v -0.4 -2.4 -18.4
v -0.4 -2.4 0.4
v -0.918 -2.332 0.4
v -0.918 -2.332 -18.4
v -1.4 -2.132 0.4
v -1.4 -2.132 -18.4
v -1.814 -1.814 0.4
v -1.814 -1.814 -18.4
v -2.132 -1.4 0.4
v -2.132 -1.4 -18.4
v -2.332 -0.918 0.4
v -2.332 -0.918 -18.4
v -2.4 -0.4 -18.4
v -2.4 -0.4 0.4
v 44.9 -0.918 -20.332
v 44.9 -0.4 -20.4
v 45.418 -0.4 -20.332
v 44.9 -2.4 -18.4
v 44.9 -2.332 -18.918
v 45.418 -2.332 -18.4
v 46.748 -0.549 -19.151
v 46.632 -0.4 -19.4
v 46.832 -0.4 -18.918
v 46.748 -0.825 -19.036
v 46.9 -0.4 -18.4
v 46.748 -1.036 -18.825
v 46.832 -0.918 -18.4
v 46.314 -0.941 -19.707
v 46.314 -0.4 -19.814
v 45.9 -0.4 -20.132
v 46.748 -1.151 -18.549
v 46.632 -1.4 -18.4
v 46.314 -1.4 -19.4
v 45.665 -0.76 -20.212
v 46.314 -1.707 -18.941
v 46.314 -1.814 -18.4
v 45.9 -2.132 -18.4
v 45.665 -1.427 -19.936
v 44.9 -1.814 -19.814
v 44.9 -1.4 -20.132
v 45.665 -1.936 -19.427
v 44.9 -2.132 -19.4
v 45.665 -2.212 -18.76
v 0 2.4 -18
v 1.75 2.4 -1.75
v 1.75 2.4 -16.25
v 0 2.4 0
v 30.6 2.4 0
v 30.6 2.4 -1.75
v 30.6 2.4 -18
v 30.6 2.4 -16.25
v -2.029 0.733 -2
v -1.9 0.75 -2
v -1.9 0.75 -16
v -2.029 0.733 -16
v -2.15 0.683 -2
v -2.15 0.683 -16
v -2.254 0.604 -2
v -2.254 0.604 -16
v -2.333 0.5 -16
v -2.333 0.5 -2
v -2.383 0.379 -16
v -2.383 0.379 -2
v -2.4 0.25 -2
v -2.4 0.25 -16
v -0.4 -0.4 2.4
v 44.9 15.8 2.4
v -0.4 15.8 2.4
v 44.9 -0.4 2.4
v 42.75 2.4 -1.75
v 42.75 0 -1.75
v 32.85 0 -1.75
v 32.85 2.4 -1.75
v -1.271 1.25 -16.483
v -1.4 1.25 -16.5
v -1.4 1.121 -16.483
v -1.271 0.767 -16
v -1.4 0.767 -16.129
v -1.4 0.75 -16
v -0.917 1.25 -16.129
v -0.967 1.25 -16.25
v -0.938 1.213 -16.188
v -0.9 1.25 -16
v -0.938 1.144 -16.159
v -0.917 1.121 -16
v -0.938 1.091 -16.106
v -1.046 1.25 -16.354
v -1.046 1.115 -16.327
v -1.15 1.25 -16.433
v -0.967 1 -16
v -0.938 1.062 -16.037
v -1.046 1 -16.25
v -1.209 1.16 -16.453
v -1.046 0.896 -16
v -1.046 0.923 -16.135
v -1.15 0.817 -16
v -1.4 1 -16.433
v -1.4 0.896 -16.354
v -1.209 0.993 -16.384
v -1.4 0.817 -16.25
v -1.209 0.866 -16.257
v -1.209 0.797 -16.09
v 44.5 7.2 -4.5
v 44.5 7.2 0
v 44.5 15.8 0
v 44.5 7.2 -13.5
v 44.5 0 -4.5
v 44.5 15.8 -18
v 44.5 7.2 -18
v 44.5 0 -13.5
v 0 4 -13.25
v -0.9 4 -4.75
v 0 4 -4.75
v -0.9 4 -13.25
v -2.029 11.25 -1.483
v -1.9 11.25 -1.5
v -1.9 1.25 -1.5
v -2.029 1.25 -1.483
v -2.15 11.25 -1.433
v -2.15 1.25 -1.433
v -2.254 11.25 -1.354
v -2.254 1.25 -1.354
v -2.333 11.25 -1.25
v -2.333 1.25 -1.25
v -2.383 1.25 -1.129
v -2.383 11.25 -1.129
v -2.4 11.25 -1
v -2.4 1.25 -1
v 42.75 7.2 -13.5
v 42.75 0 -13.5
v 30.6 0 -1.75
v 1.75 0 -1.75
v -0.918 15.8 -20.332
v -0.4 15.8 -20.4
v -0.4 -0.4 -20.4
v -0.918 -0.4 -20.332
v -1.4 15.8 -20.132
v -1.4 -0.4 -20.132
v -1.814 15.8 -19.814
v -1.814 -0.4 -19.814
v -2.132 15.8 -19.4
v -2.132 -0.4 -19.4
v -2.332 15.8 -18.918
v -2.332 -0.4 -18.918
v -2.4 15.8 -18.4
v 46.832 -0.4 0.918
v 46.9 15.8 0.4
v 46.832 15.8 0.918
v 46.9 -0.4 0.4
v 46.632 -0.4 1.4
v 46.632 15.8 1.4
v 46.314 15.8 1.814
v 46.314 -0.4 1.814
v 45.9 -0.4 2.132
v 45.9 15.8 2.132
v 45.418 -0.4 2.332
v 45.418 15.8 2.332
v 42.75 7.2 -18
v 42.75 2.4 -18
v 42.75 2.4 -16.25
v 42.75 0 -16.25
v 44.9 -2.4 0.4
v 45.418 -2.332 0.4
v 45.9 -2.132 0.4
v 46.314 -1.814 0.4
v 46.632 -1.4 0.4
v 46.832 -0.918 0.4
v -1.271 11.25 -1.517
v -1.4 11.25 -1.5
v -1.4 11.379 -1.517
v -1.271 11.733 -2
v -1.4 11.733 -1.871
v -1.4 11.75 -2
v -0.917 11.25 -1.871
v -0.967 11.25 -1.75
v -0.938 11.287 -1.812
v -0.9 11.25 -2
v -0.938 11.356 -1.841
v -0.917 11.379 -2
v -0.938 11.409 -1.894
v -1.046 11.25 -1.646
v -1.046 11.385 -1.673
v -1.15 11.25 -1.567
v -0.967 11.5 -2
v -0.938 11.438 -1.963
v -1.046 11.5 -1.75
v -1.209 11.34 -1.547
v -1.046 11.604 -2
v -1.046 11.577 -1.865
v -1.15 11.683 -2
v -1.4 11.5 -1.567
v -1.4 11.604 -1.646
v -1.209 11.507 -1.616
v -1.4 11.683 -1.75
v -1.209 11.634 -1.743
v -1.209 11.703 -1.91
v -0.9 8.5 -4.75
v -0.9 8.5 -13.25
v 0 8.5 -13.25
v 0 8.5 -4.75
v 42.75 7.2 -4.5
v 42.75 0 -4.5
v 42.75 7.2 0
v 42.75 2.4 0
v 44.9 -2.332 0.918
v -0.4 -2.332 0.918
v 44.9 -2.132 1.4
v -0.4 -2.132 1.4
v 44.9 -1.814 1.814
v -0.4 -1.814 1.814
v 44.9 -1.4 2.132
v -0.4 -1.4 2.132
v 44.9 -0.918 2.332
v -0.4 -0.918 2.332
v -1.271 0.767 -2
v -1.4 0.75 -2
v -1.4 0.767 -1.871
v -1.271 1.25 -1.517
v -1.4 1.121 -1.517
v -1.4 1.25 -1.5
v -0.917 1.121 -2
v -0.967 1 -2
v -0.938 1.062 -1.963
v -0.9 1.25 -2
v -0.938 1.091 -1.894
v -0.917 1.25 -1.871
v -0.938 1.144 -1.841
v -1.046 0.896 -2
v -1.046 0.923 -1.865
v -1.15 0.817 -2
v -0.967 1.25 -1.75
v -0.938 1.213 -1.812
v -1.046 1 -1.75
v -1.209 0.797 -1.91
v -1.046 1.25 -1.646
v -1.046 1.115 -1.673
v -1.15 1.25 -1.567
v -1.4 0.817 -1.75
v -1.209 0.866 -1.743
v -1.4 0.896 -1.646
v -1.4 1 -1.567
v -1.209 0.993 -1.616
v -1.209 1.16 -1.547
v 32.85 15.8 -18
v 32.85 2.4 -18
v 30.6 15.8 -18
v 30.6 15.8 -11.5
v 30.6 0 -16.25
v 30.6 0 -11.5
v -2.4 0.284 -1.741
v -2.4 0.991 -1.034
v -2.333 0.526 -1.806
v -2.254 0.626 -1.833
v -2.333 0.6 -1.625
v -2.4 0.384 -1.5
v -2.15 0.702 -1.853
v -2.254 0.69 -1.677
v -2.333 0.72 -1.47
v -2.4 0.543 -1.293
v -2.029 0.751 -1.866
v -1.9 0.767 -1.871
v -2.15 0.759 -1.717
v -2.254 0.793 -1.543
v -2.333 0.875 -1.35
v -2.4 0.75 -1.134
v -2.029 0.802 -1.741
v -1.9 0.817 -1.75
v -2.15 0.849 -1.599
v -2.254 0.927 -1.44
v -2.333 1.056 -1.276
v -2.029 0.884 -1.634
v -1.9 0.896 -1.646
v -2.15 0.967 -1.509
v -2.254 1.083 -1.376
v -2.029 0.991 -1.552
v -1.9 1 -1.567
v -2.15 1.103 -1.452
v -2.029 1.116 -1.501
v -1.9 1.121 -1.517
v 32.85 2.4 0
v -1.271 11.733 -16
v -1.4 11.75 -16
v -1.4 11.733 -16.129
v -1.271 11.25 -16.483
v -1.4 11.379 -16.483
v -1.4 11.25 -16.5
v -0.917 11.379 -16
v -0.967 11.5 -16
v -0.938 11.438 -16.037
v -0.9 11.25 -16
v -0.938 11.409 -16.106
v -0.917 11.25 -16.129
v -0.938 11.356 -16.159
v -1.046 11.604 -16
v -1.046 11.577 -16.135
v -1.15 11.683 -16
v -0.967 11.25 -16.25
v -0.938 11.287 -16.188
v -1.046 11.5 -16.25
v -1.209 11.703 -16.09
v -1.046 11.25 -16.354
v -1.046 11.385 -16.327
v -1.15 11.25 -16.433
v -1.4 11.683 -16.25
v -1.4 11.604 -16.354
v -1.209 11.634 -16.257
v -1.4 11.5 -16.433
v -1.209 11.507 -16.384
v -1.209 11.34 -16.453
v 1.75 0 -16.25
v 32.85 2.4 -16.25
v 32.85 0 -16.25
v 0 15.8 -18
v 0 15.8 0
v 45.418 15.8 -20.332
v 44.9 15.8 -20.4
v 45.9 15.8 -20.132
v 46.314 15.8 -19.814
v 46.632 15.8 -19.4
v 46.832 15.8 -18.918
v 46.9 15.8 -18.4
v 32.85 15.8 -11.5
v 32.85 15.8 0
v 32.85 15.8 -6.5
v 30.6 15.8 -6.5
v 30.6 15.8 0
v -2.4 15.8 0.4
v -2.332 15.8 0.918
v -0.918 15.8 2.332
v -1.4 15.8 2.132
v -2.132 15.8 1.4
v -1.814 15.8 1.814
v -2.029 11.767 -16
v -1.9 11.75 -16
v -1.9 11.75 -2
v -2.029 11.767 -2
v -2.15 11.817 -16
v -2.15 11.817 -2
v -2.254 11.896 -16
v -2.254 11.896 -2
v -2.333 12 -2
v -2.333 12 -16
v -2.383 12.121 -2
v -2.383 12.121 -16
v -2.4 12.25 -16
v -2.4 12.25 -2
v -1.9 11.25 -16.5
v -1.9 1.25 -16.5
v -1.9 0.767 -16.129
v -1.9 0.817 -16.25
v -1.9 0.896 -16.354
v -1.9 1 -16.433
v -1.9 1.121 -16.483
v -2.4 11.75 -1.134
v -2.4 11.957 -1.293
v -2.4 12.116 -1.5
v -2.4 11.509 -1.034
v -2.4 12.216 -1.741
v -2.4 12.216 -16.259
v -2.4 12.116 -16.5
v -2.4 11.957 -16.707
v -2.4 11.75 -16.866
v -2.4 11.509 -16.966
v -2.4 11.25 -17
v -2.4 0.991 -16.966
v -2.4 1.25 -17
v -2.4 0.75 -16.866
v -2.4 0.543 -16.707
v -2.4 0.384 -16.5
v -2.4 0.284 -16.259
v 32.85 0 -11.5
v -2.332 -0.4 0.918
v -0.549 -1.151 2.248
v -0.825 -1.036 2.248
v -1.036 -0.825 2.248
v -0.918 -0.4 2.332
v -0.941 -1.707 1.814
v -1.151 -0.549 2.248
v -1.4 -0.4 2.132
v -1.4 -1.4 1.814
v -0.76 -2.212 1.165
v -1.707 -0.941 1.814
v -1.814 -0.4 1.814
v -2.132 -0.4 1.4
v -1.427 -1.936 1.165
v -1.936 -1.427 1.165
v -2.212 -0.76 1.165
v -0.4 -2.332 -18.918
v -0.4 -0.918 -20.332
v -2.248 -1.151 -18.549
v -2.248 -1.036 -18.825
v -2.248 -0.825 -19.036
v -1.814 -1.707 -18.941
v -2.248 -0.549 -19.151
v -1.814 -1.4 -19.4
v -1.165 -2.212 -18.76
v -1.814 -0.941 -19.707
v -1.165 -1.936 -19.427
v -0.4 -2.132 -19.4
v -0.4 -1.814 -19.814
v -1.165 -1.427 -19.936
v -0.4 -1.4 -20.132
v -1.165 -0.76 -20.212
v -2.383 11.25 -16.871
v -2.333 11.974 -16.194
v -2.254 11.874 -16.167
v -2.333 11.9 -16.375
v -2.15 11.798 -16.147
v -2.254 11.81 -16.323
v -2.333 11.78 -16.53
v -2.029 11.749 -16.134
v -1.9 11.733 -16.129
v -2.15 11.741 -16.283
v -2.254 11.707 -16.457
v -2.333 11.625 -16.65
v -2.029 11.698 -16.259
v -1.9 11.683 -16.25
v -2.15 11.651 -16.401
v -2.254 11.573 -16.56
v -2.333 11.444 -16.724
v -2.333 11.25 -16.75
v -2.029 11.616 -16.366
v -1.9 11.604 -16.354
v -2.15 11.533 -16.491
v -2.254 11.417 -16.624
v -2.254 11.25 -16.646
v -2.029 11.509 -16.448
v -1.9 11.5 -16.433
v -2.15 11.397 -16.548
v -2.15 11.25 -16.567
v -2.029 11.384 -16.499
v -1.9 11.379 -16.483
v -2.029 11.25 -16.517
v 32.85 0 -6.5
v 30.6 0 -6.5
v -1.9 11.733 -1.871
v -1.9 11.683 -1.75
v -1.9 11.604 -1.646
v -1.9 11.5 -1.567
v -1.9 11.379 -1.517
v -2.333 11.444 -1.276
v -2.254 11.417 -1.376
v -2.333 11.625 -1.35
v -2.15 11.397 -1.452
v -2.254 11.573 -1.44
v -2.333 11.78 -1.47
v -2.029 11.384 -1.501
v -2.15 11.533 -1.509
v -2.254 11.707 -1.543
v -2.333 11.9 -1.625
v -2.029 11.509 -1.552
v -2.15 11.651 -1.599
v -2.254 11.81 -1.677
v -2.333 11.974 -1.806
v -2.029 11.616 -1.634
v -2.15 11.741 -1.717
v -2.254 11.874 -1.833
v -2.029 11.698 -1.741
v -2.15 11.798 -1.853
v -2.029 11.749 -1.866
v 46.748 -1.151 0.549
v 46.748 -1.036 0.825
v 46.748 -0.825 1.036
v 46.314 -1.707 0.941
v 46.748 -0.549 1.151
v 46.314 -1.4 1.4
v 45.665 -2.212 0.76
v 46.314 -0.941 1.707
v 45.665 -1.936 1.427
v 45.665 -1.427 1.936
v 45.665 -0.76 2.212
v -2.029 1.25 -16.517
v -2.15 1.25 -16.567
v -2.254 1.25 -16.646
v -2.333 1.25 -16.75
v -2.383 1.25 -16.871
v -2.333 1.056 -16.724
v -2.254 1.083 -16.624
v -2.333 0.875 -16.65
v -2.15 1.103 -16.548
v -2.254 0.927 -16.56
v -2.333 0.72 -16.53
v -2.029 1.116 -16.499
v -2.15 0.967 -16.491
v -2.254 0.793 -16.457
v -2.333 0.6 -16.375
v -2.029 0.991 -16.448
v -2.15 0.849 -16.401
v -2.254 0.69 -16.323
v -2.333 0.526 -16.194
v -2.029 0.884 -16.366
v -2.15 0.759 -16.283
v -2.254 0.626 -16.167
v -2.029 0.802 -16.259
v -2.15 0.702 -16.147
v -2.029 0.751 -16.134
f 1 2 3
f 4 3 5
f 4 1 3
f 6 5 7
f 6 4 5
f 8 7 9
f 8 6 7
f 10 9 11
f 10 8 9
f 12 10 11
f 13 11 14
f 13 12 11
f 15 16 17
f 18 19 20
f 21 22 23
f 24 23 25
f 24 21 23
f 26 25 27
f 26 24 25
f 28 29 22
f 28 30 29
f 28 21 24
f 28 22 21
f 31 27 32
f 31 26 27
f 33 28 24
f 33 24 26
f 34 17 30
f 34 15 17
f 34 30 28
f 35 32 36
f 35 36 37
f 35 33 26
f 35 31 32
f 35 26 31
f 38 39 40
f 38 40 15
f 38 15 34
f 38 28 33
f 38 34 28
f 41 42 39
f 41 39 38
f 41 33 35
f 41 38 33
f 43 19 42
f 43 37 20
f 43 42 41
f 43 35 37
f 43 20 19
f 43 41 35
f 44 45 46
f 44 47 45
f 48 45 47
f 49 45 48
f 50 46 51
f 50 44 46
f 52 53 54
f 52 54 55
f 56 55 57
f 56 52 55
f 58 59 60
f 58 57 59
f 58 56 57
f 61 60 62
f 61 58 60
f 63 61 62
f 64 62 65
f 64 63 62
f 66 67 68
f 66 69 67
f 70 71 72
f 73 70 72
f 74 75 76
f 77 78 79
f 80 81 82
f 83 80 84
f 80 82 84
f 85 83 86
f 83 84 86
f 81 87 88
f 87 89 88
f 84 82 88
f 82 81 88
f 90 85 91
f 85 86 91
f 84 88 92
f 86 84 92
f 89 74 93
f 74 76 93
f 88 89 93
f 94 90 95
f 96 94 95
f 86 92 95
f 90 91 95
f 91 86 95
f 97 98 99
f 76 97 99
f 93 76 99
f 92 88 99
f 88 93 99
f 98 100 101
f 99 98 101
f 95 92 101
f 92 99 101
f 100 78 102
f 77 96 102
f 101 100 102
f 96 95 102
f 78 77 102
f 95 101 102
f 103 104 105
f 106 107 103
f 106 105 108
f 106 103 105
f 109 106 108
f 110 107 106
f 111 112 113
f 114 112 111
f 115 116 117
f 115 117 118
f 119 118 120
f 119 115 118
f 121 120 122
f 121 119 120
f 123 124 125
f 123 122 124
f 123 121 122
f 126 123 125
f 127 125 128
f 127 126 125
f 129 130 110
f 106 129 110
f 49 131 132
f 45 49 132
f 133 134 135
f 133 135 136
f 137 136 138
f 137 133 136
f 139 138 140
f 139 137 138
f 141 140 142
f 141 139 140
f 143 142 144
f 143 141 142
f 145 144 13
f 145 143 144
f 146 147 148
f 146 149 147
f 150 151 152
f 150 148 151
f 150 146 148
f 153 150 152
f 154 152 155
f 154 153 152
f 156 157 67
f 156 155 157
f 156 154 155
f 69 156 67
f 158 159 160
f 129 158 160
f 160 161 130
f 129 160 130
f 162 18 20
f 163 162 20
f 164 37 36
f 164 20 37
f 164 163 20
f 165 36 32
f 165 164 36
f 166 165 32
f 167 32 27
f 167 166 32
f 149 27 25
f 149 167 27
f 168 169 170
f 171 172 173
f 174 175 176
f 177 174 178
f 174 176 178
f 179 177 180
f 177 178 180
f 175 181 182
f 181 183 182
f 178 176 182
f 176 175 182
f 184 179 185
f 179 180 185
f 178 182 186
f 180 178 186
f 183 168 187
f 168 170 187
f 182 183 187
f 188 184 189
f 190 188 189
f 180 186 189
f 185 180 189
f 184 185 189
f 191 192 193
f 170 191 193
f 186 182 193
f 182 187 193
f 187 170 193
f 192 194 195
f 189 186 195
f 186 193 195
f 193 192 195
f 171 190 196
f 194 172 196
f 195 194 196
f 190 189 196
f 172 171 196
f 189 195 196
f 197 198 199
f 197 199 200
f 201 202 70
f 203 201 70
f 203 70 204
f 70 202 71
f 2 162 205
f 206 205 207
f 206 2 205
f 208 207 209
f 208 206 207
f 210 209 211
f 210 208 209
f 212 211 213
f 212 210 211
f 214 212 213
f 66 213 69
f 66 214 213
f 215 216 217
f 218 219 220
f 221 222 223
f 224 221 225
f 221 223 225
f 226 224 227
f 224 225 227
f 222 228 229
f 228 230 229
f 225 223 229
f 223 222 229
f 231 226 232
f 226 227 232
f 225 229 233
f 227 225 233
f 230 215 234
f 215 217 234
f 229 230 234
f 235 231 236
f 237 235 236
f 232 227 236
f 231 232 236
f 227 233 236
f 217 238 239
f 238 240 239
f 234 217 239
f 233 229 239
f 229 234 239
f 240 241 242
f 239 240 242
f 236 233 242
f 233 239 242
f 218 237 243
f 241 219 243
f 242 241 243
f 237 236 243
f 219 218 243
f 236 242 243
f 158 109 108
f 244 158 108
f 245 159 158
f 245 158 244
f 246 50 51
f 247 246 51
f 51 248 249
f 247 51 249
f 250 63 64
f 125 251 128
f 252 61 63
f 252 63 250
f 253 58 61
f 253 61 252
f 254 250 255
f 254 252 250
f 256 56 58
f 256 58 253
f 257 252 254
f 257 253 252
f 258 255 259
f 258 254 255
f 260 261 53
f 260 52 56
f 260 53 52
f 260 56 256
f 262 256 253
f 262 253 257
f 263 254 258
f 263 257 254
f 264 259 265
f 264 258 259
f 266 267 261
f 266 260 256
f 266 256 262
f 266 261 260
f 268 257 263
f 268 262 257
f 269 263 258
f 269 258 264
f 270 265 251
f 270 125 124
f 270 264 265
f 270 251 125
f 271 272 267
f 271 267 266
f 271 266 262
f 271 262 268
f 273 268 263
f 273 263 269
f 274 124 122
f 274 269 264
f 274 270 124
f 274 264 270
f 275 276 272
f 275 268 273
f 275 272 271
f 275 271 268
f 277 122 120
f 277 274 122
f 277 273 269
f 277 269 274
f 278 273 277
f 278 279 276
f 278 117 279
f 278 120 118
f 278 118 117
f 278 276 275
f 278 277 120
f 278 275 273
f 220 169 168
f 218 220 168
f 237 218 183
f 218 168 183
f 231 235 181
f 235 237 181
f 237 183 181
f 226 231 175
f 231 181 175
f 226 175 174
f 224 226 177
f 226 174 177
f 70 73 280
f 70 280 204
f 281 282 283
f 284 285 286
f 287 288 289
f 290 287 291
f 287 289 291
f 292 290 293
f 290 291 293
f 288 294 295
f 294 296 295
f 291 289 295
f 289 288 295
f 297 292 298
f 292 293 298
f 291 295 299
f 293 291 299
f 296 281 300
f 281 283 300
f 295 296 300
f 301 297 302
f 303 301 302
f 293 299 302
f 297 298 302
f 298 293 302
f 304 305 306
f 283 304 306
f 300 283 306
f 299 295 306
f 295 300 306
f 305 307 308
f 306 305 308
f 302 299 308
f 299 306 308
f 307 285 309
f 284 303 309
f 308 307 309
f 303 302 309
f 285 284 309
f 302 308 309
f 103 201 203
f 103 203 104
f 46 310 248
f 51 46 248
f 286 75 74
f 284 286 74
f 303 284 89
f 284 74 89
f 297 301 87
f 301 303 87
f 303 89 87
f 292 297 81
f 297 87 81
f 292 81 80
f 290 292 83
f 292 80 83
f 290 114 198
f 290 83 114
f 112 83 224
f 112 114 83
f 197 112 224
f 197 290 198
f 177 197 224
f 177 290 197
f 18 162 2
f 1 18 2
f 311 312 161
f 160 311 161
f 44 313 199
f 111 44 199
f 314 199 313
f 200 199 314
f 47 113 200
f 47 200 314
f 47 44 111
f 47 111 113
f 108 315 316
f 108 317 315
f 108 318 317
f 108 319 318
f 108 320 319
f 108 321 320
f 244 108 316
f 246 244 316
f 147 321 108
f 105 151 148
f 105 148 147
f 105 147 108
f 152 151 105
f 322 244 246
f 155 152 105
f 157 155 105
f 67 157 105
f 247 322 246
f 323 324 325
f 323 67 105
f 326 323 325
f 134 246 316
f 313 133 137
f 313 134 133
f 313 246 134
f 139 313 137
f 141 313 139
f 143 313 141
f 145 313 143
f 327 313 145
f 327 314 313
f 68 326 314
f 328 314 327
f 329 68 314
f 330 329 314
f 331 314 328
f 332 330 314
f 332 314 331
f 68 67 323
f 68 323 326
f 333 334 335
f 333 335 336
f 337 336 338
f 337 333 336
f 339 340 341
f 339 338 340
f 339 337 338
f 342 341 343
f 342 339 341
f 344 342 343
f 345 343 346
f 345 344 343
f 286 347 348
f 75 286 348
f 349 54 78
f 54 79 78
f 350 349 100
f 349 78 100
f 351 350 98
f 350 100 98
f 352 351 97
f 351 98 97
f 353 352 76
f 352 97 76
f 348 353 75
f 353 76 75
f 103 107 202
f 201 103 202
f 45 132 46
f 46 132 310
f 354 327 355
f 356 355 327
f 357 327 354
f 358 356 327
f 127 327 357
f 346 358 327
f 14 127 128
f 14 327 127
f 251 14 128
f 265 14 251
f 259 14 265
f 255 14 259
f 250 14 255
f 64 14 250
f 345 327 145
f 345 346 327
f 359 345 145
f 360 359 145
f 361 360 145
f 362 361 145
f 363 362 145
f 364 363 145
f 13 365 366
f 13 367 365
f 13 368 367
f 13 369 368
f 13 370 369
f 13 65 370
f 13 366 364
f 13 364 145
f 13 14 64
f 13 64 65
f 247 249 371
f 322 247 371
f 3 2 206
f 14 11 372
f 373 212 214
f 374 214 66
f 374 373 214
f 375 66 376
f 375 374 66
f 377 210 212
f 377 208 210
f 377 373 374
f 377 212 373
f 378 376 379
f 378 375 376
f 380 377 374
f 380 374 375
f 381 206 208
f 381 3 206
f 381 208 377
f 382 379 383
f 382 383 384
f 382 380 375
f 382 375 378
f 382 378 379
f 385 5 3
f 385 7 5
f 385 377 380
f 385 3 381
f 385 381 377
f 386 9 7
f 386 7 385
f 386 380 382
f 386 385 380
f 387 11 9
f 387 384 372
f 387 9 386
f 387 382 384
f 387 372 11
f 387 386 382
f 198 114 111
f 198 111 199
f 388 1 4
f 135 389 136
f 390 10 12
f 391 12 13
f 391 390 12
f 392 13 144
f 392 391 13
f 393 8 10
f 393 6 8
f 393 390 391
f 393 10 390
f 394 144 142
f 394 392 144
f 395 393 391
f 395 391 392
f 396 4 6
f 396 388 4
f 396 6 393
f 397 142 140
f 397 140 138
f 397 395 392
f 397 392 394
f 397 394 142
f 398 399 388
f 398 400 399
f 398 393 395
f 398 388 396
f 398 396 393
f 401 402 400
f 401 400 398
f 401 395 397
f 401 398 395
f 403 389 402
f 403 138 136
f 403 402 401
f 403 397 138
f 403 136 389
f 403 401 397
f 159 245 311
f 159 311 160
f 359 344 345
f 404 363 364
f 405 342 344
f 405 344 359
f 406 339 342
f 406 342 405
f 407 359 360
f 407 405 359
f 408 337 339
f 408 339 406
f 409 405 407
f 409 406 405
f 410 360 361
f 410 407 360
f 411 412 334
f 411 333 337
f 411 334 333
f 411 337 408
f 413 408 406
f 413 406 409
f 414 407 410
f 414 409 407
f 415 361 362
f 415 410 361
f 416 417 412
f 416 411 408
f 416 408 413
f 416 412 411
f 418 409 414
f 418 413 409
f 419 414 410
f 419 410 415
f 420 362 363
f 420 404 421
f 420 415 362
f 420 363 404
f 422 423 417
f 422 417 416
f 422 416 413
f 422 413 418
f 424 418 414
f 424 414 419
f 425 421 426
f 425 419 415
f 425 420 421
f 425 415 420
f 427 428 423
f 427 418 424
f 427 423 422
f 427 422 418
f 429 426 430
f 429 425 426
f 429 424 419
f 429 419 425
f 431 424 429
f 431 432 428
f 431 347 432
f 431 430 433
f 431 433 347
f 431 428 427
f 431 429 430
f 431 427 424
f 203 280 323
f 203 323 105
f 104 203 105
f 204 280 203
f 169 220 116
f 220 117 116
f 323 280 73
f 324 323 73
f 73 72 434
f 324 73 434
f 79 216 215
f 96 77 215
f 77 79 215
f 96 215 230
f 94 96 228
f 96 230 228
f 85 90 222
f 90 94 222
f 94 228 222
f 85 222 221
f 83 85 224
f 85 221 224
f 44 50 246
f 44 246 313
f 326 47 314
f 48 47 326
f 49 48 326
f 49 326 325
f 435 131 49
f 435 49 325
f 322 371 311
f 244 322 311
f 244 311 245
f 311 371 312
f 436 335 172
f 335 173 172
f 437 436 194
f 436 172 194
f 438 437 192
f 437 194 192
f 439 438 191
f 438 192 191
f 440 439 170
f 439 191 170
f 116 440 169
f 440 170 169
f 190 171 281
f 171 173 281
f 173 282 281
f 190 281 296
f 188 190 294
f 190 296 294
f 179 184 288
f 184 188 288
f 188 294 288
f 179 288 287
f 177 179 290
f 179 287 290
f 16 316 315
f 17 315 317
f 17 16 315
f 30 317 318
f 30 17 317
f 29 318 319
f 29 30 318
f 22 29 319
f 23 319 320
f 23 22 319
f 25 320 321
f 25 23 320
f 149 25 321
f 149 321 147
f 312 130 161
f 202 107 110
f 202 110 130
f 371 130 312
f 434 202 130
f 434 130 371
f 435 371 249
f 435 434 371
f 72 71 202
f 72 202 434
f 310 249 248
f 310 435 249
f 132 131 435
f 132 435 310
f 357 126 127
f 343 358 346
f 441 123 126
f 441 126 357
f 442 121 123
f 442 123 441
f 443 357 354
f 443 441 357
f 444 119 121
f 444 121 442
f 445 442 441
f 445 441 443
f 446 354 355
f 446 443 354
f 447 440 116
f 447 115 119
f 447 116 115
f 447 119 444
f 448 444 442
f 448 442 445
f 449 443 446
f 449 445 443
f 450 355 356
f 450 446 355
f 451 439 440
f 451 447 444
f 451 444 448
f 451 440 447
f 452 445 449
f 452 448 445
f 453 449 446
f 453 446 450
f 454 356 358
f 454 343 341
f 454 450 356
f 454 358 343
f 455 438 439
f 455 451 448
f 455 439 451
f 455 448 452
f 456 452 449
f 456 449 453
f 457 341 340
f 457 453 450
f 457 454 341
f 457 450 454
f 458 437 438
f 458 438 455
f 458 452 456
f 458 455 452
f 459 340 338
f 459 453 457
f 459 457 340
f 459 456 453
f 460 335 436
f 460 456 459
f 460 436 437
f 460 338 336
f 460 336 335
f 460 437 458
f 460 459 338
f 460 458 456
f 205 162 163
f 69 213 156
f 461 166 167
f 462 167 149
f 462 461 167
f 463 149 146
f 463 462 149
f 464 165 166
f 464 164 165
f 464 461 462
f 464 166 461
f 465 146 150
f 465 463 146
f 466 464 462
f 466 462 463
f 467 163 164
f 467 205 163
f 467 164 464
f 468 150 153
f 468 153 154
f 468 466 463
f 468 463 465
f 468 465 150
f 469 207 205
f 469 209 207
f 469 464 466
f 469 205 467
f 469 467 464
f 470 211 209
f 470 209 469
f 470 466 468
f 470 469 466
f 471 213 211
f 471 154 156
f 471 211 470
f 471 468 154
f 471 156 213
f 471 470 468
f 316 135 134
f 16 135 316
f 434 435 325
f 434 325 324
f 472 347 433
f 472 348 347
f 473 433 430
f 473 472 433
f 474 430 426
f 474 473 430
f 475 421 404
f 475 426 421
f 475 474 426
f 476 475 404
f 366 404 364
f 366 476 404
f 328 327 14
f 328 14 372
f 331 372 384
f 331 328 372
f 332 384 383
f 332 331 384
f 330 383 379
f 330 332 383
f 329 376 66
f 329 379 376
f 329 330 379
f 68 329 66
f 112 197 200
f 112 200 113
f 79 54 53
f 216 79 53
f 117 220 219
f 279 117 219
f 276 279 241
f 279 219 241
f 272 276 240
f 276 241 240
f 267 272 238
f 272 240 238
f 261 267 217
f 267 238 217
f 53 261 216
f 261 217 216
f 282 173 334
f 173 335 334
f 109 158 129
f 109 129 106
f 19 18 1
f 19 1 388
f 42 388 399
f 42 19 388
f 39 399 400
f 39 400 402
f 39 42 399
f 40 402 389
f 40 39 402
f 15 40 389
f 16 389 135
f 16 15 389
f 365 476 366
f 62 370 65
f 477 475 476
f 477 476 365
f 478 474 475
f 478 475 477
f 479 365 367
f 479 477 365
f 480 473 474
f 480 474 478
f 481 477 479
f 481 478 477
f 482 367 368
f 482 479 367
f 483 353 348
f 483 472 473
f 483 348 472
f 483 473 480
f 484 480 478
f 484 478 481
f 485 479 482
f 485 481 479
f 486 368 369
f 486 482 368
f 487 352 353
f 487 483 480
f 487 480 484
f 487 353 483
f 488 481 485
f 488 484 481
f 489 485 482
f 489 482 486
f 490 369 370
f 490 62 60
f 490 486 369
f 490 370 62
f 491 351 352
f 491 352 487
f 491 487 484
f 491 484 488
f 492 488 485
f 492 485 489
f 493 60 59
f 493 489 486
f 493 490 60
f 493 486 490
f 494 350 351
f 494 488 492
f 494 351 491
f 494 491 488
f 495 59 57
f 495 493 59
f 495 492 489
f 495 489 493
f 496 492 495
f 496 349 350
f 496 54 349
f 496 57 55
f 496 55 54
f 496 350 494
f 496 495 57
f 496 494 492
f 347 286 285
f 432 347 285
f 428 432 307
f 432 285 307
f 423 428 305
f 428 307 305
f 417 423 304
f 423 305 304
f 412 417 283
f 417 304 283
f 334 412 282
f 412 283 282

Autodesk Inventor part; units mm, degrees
ref_plane "YZ Plane" through (0, 0, 0) normal (1, 0, 0) x (0, 1, 0)
ref_plane "XZ Plane" through (0, 0, 0) normal (0, 1, 0) x (-1, 0, 0)
ref_plane "XY Plane" through (0, 0, 0) normal (0, 0, 1) x (1, 0, 0)
sketch "Sketch1" plane through (0, 0, 0) normal (0, 1, 0) x (-1, 0, 0)
  line L0 (0, 0) -> (-44.5, 0)
  line L1 (-44.5, 0) -> (-44.5, -18)
  line L2 (-44.5, -18) -> (0, -18)
  line L3 (0, -18) -> (0, 0)
  line L4 (2.4, -20.4) -> (-46.9, -20.4)
  line L5 (-46.9, -20.4) -> (-46.9, 2.4)
  line L6 (-46.9, 2.4) -> (2.4, 2.4)
  line L7 (2.4, 2.4) -> (2.4, -20.4)
  dimension "d0" = 18
  dimension "d1" = 44.5
  dimension "d2" = 2.4
extrude "Extrusion1" add sketch "Sketch1" against normal blind 2.4 contours L3 L2 L1 L0 | L4 L5 L6 L7
extrude "Extrusion2" add sketch "Sketch1" along normal blind 15.8
sketch "Sketch2" plane through (0, 0, 0) normal (0, 1, 0) x (1, 0, 0)
  line L0 (0, 0) -> (44.5, 0) projected
  line L1 (44.5, 0) -> (44.5, 18) projected
  line L2 (44.5, 18) -> (0, 18) projected
  line L3 (0, 18) -> (0, 0) projected
  line L4 (1.75, 16.25) -> (42.75, 16.25)
  line L5 (42.75, 16.25) -> (42.75, 1.75)
  line L6 (42.75, 1.75) -> (1.75, 1.75)
  line L7 (1.75, 1.75) -> (1.75, 16.25)
  line L8 (32.85, 17.25) -> (42.75, 17.25)
  line L9 (42.75, 17.25) -> (42.75, 0.75)
  line L10 (42.75, 0.75) -> (32.85, 0.75)
  line L11 (32.85, 0.75) -> (32.85, 17.25)
  line L12 (42.75, 13.5) -> (44.5, 13.5)
  line L13 (44.5, 13.5) -> (44.5, 4.5)
  line L14 (44.5, 4.5) -> (42.75, 4.5)
  line L15 (42.75, 4.5) -> (42.75, 13.5)
  line L16 (44.5, 18) -> (44.5, 0) projected
  point P0 (42.75, 9)
  point P1 (44.5, 9)
  point P2 (43.625, 4.5)
  point P3 (42.75, 4.5)
  point P4 (42.75, 13.5)
  dimension "d7" = 1.75
  dimension "d8" = 9.9
  dimension "d9" = 16.5
  dimension "d10" = 9
extrude "Extrusion3" add sketch "Sketch2" along normal blind 2.4 contours L3 L2 L1 L12 L5 L9 L8 L11 L4 L7 L6 L10 L14 L0 | L9 L10 L11 L6 | L4 L11 L8 L9
sketch "Sketch3" plane through (0, 2.4, 0) normal (0, 1, 0) x (1, 0, 0)
  line L0 (32.85, 0.75) -> (32.85, 17.25) projected
  line L1 (44.5, 4.5) -> (44.5, 0) projected
  line L2 (44.5, 4.5) -> (42.75, 4.5) projected
  line L3 (42.75, 4.5) -> (42.75, 1.75) projected
  line L4 (42.75, 1.75) -> (1.75, 1.75) projected
  line L5 (1.75, 1.75) -> (1.75, 16.25) projected
  line L6 (1.75, 16.25) -> (42.75, 16.25) projected
  line L7 (42.75, 16.25) -> (42.75, 13.5) projected
  line L8 (42.75, 13.5) -> (44.5, 13.5) projected
  line L9 (44.5, 18) -> (44.5, 13.5) projected
  line L10 (0, 18) -> (44.5, 18) projected
  line L11 (0, 0) -> (0, 18) projected
  line L12 (44.5, 0) -> (0, 0) projected
  line L13 (32.85, 18) -> (30.6, 18)
  line L14 (30.6, 18) -> (30.6, 11.5)
  line L15 (30.6, 11.5) -> (32.85, 11.5)
  line L16 (32.85, 11.5) -> (32.85, 18)
  line L17 (32.85, 0) -> (30.6, 0)
  line L18 (30.6, 0) -> (30.6, 6.5)
  line L19 (30.6, 6.5) -> (32.85, 6.5)
  line L20 (32.85, 6.5) -> (32.85, 0)
  line L21 (44.5, 0) -> (0, 0) projected
  line L22 (0, 18) -> (44.5, 18) projected
  point P0 (30.6, 1.75)
  point P1 (32.85, 1.75)
  point P2 (32.85, 16.25)
  point P3 (30.6, 16.25)
  point P4 (32.85, 0)
  dimension "d13" = 5
  dimension "d14" = 30.6
extrude "Extrusion4" add sketch "Sketch3" against normal up to surface (2.4 mm away) contours L0 L4 L18 L19 | L15 L14 L6 L0
extrude "Extrusion5" add sketch "Sketch3" along normal up to surface (13.4 mm away) contours L0 L4 L18 L19 | L15 L14 L6 L0 | L0 L20 L12 L18 L4 | L6 L14 L10 L16 L0
sketch "Sketch4" plane through (0, 2.4, 0) normal (0, 1, 0) x (1, 0, 0)
  line L0 (32.85, 18) -> (32.85, 16.25) projected
  line L1 (32.85, 16.25) -> (42.75, 16.25) projected
  line L2 (42.75, 16.25) -> (42.75, 13.5) projected
  line L3 (42.75, 13.5) -> (44.5, 13.5) projected
  line L4 (44.5, 18) -> (44.5, 13.5) projected
  line L5 (32.85, 18) -> (44.5, 18) projected
  line L6 (32.85, 1.75) -> (32.85, 0) projected
  line L7 (44.5, 0) -> (32.85, 0) projected
  line L8 (44.5, 4.5) -> (44.5, 0) projected
  line L9 (44.5, 4.5) -> (42.75, 4.5) projected
  line L10 (42.75, 4.5) -> (42.75, 1.75) projected
  line L11 (42.75, 1.75) -> (32.85, 1.75) projected
  line L12 (42.75, 16.25) -> (42.75, 18)
  line L13 (42.75, 1.75) -> (42.75, 0)
  point P0 (0, 0)
extrude "Extrusion6" add sketch "Sketch4" along normal blind 4.8 contours L5 L4 L3 L2 L12 | L10 L9 L8 L7 L13
sketch "Sketch5" plane through (-2.4, -2.4, -20.4) normal (-1, 0, 0) x (0, 0, 1)
  line L0 (20.4, 4.8) -> (2.4, 4.8) projected
  line L1 (7.15, 10.9) -> (15.65, 10.9)
  line L2 (15.65, 10.9) -> (15.65, 6.4)
  line L3 (15.65, 6.4) -> (7.15, 6.4)
  line L4 (7.15, 6.4) -> (7.15, 10.9)
  line L5 (11.4, 4.8) -> (11.4, 2.8169) construction
  point P0 (20.4, 2.4)
  point P1 (11.4, 6.4)
  dimension "d21" = 8.5
  dimension "d22" = 4.5
  dimension "d23" = 1.6
extrude "Extrusion7" cut sketch "Sketch5" against normal up to surface (2.4 mm away)
sketch "Sketch6" plane through (-2.4, -2.4, -20.4) normal (-1, 0, 0) x (0, 0, 1)
  line L0 (7.15, 10.9) -> (15.65, 10.9) projected
  line L1 (7.15, 6.4) -> (7.15, 10.9) projected
  line L2 (15.65, 6.4) -> (7.15, 6.4) projected
  line L3 (15.65, 10.9) -> (15.65, 6.4) projected
  line L4 (18.9, 14.15) -> (3.9, 14.15)
  line L5 (3.9, 14.15) -> (3.9, 3.15)
  line L6 (3.9, 3.15) -> (18.9, 3.15)
  line L7 (18.9, 3.15) -> (18.9, 14.15)
  point P0 (20.4, 2.4)
  dimension "d26" = 15
extrude "Extrusion8" cut sketch "Sketch6" against normal blind 1.5
fillet "Fillet1" radius 0.5 12 edges at (-1.65, 11.75, -16.5) (-1.65, 11.75, -1.5) (-1.65, 0.75, -1.5) (-1.65, 0.75, -16.5) (-2.4, 11.75, -9) (-2.4, 6.25, -16.5) (-2.4, 0.75, -9) (-2.4, 6.25, -1.5) (-0.9, 0.75, -9) (-0.9, 6.25, -16.5) (-0.9, 11.75, -9) (-0.9, 6.25, -1.5)
fillet "Fillet2" radius 2 8 edges at (22.25, -2.4, -20.4) (-2.4, -2.4, -9) (22.25, -2.4, 2.4) (46.9, -2.4, -9) (46.9, 6.7, 2.4) (46.9, 6.7, -20.4) (-2.4, 6.7, -20.4) (-2.4, 6.7, 2.4)
properties part number "rf_tester_bottom"
